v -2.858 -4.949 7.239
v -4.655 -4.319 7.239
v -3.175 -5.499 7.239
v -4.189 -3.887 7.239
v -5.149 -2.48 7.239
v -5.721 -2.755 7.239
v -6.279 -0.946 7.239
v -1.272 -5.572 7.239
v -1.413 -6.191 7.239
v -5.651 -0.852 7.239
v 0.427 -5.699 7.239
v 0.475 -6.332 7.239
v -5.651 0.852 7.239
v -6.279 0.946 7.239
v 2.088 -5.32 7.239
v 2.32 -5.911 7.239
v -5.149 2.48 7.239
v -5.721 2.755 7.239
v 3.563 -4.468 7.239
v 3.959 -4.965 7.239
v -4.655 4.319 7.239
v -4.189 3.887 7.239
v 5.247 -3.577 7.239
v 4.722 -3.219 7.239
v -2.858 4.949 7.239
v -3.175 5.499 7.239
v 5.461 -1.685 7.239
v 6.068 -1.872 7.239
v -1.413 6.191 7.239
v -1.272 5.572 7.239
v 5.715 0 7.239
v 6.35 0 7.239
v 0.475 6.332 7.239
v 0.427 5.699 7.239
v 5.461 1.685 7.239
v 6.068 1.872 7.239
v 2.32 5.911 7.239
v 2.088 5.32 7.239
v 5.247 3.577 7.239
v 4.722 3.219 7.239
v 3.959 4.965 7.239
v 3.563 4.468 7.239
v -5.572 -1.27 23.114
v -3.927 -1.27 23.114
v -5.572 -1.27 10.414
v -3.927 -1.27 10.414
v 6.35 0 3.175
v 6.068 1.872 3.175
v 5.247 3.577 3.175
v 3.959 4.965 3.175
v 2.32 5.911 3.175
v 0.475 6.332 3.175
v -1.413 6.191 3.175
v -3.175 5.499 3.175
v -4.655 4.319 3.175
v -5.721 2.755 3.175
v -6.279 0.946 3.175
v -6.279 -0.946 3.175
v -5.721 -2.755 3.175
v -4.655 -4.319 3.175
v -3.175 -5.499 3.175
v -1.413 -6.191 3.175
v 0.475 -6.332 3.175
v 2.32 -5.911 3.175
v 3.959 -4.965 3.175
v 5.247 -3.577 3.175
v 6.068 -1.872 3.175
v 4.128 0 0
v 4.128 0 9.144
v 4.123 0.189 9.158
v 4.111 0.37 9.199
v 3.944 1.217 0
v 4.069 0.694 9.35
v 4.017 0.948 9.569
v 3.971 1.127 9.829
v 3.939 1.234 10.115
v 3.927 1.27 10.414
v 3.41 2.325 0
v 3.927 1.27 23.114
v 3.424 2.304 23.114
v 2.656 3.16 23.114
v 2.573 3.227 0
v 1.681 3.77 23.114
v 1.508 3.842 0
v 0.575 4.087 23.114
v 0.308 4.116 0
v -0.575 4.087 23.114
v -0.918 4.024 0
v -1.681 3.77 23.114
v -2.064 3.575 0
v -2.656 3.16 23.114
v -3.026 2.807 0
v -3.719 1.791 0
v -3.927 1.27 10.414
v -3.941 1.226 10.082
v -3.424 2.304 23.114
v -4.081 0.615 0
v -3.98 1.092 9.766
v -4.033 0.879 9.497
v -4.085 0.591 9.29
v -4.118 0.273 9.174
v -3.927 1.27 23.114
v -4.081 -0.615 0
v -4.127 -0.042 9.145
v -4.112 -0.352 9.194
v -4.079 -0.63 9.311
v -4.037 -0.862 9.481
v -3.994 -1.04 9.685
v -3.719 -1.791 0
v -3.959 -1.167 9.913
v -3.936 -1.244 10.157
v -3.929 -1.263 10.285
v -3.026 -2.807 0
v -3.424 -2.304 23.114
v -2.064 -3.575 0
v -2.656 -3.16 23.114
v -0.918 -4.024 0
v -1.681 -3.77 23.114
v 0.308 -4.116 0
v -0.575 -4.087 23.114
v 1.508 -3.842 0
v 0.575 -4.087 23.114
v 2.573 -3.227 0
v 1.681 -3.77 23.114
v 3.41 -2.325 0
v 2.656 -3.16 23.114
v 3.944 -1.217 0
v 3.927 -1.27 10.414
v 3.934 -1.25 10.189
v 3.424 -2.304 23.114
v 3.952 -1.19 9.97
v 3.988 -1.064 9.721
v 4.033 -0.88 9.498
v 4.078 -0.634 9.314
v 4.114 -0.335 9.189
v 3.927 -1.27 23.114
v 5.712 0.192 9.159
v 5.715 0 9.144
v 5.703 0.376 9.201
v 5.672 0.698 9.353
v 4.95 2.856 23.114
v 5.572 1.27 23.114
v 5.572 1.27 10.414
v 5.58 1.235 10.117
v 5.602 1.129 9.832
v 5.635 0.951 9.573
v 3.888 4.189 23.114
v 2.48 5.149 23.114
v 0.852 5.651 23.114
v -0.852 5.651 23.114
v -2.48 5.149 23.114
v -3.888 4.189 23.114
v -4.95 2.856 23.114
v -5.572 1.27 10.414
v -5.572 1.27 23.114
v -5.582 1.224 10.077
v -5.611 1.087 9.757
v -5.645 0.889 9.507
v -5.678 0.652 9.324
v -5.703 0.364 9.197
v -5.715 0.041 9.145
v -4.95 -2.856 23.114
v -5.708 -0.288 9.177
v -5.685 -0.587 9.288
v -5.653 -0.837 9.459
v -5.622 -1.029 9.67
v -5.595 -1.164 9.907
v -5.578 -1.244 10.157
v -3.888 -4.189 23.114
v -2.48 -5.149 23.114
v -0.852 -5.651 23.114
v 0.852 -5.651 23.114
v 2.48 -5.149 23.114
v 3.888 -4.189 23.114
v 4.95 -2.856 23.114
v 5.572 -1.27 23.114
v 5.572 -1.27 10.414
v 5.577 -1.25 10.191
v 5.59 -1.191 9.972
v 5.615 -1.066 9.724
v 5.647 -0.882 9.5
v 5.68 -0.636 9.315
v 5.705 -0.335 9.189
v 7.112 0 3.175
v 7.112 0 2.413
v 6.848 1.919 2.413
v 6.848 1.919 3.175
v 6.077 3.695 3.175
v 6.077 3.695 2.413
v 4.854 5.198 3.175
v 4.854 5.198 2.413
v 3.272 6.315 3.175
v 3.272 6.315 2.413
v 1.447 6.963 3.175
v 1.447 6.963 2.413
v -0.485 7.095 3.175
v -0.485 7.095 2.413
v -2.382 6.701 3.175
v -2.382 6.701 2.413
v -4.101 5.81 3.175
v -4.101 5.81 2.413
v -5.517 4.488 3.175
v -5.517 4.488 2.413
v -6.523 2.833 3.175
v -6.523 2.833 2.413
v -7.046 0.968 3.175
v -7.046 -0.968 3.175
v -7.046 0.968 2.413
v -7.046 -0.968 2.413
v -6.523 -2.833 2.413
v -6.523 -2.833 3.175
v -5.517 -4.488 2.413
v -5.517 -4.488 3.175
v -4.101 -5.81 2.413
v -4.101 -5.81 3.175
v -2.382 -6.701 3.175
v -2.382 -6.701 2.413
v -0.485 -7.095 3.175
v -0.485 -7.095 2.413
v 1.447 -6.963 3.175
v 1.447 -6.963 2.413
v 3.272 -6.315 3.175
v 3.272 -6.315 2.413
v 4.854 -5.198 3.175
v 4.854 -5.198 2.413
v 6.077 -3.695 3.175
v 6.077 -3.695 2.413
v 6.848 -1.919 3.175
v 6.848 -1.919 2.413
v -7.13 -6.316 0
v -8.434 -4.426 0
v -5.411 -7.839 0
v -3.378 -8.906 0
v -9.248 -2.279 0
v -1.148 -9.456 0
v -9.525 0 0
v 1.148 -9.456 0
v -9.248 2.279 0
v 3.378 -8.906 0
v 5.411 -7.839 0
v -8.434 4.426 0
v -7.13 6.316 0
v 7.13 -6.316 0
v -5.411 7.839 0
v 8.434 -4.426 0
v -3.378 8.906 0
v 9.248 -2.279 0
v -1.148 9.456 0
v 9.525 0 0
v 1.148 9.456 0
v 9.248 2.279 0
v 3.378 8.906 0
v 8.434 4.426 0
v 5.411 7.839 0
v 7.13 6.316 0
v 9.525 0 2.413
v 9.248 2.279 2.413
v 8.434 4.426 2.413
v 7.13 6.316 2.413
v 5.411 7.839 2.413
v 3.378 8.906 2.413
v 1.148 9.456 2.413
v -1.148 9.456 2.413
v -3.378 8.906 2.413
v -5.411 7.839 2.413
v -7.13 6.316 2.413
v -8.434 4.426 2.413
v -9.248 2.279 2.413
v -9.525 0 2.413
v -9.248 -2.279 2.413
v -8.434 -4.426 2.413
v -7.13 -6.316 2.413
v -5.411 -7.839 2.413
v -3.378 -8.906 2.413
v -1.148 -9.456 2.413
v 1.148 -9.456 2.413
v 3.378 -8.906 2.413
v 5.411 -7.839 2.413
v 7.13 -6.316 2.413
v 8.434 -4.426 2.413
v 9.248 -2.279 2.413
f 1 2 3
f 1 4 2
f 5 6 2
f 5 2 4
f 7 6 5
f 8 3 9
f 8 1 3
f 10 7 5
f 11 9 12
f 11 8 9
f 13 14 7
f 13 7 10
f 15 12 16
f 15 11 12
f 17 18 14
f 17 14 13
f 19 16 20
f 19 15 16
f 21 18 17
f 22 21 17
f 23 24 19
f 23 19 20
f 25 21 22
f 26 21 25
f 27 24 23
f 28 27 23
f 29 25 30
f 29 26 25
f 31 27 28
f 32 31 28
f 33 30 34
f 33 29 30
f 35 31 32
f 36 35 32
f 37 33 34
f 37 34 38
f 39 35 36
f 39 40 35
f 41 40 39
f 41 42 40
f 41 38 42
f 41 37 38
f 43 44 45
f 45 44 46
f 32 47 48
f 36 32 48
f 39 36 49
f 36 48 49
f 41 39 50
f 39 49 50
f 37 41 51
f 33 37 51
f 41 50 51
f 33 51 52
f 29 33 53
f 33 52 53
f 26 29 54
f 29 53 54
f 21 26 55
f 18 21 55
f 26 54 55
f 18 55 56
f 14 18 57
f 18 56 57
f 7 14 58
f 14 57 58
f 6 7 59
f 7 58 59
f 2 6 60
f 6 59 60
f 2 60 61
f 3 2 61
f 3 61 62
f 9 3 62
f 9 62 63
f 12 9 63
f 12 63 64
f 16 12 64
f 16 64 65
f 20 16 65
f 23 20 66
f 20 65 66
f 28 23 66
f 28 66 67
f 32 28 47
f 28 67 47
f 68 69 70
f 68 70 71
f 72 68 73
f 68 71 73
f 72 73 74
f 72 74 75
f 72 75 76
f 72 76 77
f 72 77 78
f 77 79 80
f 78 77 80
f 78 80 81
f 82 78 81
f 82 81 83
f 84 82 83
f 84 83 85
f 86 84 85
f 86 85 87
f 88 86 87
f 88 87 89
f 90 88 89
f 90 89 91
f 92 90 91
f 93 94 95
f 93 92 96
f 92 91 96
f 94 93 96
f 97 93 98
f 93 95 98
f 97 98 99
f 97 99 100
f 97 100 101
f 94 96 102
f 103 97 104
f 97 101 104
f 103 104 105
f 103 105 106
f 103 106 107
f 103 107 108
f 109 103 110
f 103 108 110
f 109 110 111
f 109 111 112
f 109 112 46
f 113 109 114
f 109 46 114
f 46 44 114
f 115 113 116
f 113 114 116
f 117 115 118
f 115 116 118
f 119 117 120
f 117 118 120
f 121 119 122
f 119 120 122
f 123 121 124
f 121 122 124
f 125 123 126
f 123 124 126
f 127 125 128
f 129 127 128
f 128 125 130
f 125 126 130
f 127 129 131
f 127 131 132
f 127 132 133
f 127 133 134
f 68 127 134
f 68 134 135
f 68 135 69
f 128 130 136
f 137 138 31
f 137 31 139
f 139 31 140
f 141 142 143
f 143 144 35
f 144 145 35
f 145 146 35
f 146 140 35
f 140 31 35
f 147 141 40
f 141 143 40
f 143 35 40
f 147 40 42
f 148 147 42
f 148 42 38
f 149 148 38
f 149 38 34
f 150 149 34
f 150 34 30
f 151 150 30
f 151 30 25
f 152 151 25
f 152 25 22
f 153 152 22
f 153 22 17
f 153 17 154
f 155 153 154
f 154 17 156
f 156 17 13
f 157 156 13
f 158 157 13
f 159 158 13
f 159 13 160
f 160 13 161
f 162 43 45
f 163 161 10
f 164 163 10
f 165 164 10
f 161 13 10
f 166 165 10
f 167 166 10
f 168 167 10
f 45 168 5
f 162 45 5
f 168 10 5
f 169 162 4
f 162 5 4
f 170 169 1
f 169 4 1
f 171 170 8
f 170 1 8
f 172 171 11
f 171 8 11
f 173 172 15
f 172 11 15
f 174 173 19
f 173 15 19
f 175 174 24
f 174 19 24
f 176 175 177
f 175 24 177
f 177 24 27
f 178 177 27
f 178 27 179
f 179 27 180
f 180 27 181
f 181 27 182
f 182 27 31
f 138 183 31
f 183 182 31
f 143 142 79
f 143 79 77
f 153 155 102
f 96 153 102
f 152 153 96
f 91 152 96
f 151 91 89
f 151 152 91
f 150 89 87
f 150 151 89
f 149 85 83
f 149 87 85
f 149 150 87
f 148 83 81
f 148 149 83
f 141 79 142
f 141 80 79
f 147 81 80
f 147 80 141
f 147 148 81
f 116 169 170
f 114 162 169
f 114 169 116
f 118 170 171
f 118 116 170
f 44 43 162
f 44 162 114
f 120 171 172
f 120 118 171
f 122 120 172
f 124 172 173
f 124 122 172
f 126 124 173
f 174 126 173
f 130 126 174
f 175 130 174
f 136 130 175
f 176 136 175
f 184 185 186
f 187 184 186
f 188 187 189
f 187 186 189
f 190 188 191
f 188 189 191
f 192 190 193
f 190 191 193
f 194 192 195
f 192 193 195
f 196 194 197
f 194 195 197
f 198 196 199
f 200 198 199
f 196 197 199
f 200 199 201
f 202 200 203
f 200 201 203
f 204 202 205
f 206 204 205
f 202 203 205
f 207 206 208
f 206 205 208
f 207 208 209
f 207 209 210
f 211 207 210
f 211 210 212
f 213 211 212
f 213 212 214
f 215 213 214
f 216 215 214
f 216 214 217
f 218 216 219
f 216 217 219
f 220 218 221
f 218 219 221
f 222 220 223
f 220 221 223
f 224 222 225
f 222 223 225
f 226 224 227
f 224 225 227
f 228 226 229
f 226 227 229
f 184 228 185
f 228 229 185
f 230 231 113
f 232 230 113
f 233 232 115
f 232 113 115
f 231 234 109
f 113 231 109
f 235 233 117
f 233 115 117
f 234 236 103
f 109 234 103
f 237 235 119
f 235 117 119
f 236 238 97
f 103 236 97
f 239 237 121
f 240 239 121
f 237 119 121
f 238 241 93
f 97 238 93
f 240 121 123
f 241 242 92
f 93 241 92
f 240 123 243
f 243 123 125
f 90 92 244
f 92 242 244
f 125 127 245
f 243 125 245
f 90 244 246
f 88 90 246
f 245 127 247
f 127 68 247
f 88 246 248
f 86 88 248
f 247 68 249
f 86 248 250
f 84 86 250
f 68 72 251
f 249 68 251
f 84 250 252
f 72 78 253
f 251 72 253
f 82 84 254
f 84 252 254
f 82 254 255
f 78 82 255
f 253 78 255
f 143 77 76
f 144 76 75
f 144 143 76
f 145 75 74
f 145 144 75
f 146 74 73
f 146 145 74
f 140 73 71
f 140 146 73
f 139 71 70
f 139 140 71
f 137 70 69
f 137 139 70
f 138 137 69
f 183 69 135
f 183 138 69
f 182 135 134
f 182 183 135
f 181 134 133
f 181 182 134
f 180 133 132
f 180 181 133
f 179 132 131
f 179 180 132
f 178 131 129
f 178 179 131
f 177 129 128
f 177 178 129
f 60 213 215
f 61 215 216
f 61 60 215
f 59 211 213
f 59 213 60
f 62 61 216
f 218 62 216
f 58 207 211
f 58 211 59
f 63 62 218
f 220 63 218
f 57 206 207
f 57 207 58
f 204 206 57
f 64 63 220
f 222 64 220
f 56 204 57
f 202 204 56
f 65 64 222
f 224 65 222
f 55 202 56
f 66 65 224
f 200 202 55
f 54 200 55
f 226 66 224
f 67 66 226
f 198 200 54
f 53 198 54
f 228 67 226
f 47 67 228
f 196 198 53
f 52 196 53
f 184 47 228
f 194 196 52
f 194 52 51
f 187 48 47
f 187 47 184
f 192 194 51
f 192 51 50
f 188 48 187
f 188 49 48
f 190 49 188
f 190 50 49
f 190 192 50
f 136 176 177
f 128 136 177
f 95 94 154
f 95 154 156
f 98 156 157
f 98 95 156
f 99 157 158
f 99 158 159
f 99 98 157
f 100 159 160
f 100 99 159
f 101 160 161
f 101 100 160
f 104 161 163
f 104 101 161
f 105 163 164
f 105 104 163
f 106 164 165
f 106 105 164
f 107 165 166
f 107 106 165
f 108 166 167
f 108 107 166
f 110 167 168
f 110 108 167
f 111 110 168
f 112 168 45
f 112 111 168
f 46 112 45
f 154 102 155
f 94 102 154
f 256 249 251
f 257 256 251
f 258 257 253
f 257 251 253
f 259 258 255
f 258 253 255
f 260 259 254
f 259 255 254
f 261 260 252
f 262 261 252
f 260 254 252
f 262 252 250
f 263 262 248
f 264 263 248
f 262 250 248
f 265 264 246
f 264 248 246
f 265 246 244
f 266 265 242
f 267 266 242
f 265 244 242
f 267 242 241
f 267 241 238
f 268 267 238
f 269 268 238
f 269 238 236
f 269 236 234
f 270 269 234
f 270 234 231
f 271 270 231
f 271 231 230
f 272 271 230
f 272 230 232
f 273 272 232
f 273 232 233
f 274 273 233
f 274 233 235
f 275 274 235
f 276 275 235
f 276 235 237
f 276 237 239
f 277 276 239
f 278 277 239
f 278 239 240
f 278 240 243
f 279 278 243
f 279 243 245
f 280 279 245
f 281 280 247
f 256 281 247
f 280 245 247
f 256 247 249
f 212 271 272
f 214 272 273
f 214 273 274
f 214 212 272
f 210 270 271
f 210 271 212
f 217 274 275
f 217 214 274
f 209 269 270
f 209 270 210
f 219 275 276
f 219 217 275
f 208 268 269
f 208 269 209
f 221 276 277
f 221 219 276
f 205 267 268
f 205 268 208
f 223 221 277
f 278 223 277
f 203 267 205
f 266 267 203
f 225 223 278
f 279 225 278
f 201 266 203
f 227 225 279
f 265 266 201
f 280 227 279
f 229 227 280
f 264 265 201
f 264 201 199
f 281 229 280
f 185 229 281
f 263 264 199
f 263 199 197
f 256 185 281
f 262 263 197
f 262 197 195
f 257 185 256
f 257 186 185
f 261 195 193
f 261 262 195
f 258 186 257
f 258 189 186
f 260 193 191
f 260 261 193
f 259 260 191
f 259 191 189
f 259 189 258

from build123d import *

# Parameters (mm, degrees)
SKETCH1_R           = 9.525
BOSS_EXTRUDE1_DEPTH = 3.175
SKETCH2_R           = 6.35
BOSS_EXTRUDE2_DEPTH = 4.064
SKETCH3_R           = 5.715
BOSS_EXTRUDE3_DEPTH = 15.875
SKETCH4_R           = 4.1275
CUT_EXTRUDE1_DEPTH  = 27.752724086
SKETCH5_W           = 12.7
SKETCH5_H           = 2.54
CUT_EXTRUDE2_DEPTH  = 9.525
CUT_EXTRUDE4_START  = -0.762
SKETCH7_R           = 9.525
SKETCH7_R_2         = 7.112
CUT_EXTRUDE4_DEPTH  = 0.762


with BuildPart() as part:
    # Sketch1 → Boss-Extrude1 (new body)
    with BuildSketch(Plane.XY):
        Circle(SKETCH1_R)
    extrude(amount=BOSS_EXTRUDE1_DEPTH)

    # Sketch2 → Boss-Extrude2 (add)
    with BuildSketch(Plane.XY.offset(3.175)):
        Circle(SKETCH2_R)
    extrude(amount=BOSS_EXTRUDE2_DEPTH)

    # Sketch3 → Boss-Extrude3 (add)
    with BuildSketch(Plane.XY.offset(7.239)):
        Circle(SKETCH3_R)
    extrude(amount=BOSS_EXTRUDE3_DEPTH)

    # Sketch4 → Cut-Extrude1 (cut, through all)
    with BuildSketch(Plane.XY.offset(23.114)):
        Circle(SKETCH4_R)
    extrude(amount=-CUT_EXTRUDE1_DEPTH, mode=Mode.SUBTRACT)

    # Sketch5 → Cut-Extrude2 (cut, symmetric)
    with BuildSketch(Plane(origin=(0, 0, 0), x_dir=(0, 0, -1), z_dir=(1, 0, 0))):
        with Locations((-16.764, 0)):
            Rectangle(SKETCH5_W, SKETCH5_H)
        with BuildLine():
            ThreePointArc((-10.414, 1.27), (-9.144, 0), (-10.414, -1.27))
            Line((-10.414, -1.27), (-10.414, 1.27))
        make_face()
    extrude(amount=CUT_EXTRUDE2_DEPTH, both=True, mode=Mode.SUBTRACT)

    # Sketch7 → Cut-Extrude4 (cut)
    with BuildSketch(Plane.XY.offset(3.175).offset(CUT_EXTRUDE4_START)):
        Circle(SKETCH7_R)
        Circle(SKETCH7_R_2, mode=Mode.SUBTRACT)
    extrude(amount=CUT_EXTRUDE4_DEPTH, mode=Mode.SUBTRACT)


solid = part.part
